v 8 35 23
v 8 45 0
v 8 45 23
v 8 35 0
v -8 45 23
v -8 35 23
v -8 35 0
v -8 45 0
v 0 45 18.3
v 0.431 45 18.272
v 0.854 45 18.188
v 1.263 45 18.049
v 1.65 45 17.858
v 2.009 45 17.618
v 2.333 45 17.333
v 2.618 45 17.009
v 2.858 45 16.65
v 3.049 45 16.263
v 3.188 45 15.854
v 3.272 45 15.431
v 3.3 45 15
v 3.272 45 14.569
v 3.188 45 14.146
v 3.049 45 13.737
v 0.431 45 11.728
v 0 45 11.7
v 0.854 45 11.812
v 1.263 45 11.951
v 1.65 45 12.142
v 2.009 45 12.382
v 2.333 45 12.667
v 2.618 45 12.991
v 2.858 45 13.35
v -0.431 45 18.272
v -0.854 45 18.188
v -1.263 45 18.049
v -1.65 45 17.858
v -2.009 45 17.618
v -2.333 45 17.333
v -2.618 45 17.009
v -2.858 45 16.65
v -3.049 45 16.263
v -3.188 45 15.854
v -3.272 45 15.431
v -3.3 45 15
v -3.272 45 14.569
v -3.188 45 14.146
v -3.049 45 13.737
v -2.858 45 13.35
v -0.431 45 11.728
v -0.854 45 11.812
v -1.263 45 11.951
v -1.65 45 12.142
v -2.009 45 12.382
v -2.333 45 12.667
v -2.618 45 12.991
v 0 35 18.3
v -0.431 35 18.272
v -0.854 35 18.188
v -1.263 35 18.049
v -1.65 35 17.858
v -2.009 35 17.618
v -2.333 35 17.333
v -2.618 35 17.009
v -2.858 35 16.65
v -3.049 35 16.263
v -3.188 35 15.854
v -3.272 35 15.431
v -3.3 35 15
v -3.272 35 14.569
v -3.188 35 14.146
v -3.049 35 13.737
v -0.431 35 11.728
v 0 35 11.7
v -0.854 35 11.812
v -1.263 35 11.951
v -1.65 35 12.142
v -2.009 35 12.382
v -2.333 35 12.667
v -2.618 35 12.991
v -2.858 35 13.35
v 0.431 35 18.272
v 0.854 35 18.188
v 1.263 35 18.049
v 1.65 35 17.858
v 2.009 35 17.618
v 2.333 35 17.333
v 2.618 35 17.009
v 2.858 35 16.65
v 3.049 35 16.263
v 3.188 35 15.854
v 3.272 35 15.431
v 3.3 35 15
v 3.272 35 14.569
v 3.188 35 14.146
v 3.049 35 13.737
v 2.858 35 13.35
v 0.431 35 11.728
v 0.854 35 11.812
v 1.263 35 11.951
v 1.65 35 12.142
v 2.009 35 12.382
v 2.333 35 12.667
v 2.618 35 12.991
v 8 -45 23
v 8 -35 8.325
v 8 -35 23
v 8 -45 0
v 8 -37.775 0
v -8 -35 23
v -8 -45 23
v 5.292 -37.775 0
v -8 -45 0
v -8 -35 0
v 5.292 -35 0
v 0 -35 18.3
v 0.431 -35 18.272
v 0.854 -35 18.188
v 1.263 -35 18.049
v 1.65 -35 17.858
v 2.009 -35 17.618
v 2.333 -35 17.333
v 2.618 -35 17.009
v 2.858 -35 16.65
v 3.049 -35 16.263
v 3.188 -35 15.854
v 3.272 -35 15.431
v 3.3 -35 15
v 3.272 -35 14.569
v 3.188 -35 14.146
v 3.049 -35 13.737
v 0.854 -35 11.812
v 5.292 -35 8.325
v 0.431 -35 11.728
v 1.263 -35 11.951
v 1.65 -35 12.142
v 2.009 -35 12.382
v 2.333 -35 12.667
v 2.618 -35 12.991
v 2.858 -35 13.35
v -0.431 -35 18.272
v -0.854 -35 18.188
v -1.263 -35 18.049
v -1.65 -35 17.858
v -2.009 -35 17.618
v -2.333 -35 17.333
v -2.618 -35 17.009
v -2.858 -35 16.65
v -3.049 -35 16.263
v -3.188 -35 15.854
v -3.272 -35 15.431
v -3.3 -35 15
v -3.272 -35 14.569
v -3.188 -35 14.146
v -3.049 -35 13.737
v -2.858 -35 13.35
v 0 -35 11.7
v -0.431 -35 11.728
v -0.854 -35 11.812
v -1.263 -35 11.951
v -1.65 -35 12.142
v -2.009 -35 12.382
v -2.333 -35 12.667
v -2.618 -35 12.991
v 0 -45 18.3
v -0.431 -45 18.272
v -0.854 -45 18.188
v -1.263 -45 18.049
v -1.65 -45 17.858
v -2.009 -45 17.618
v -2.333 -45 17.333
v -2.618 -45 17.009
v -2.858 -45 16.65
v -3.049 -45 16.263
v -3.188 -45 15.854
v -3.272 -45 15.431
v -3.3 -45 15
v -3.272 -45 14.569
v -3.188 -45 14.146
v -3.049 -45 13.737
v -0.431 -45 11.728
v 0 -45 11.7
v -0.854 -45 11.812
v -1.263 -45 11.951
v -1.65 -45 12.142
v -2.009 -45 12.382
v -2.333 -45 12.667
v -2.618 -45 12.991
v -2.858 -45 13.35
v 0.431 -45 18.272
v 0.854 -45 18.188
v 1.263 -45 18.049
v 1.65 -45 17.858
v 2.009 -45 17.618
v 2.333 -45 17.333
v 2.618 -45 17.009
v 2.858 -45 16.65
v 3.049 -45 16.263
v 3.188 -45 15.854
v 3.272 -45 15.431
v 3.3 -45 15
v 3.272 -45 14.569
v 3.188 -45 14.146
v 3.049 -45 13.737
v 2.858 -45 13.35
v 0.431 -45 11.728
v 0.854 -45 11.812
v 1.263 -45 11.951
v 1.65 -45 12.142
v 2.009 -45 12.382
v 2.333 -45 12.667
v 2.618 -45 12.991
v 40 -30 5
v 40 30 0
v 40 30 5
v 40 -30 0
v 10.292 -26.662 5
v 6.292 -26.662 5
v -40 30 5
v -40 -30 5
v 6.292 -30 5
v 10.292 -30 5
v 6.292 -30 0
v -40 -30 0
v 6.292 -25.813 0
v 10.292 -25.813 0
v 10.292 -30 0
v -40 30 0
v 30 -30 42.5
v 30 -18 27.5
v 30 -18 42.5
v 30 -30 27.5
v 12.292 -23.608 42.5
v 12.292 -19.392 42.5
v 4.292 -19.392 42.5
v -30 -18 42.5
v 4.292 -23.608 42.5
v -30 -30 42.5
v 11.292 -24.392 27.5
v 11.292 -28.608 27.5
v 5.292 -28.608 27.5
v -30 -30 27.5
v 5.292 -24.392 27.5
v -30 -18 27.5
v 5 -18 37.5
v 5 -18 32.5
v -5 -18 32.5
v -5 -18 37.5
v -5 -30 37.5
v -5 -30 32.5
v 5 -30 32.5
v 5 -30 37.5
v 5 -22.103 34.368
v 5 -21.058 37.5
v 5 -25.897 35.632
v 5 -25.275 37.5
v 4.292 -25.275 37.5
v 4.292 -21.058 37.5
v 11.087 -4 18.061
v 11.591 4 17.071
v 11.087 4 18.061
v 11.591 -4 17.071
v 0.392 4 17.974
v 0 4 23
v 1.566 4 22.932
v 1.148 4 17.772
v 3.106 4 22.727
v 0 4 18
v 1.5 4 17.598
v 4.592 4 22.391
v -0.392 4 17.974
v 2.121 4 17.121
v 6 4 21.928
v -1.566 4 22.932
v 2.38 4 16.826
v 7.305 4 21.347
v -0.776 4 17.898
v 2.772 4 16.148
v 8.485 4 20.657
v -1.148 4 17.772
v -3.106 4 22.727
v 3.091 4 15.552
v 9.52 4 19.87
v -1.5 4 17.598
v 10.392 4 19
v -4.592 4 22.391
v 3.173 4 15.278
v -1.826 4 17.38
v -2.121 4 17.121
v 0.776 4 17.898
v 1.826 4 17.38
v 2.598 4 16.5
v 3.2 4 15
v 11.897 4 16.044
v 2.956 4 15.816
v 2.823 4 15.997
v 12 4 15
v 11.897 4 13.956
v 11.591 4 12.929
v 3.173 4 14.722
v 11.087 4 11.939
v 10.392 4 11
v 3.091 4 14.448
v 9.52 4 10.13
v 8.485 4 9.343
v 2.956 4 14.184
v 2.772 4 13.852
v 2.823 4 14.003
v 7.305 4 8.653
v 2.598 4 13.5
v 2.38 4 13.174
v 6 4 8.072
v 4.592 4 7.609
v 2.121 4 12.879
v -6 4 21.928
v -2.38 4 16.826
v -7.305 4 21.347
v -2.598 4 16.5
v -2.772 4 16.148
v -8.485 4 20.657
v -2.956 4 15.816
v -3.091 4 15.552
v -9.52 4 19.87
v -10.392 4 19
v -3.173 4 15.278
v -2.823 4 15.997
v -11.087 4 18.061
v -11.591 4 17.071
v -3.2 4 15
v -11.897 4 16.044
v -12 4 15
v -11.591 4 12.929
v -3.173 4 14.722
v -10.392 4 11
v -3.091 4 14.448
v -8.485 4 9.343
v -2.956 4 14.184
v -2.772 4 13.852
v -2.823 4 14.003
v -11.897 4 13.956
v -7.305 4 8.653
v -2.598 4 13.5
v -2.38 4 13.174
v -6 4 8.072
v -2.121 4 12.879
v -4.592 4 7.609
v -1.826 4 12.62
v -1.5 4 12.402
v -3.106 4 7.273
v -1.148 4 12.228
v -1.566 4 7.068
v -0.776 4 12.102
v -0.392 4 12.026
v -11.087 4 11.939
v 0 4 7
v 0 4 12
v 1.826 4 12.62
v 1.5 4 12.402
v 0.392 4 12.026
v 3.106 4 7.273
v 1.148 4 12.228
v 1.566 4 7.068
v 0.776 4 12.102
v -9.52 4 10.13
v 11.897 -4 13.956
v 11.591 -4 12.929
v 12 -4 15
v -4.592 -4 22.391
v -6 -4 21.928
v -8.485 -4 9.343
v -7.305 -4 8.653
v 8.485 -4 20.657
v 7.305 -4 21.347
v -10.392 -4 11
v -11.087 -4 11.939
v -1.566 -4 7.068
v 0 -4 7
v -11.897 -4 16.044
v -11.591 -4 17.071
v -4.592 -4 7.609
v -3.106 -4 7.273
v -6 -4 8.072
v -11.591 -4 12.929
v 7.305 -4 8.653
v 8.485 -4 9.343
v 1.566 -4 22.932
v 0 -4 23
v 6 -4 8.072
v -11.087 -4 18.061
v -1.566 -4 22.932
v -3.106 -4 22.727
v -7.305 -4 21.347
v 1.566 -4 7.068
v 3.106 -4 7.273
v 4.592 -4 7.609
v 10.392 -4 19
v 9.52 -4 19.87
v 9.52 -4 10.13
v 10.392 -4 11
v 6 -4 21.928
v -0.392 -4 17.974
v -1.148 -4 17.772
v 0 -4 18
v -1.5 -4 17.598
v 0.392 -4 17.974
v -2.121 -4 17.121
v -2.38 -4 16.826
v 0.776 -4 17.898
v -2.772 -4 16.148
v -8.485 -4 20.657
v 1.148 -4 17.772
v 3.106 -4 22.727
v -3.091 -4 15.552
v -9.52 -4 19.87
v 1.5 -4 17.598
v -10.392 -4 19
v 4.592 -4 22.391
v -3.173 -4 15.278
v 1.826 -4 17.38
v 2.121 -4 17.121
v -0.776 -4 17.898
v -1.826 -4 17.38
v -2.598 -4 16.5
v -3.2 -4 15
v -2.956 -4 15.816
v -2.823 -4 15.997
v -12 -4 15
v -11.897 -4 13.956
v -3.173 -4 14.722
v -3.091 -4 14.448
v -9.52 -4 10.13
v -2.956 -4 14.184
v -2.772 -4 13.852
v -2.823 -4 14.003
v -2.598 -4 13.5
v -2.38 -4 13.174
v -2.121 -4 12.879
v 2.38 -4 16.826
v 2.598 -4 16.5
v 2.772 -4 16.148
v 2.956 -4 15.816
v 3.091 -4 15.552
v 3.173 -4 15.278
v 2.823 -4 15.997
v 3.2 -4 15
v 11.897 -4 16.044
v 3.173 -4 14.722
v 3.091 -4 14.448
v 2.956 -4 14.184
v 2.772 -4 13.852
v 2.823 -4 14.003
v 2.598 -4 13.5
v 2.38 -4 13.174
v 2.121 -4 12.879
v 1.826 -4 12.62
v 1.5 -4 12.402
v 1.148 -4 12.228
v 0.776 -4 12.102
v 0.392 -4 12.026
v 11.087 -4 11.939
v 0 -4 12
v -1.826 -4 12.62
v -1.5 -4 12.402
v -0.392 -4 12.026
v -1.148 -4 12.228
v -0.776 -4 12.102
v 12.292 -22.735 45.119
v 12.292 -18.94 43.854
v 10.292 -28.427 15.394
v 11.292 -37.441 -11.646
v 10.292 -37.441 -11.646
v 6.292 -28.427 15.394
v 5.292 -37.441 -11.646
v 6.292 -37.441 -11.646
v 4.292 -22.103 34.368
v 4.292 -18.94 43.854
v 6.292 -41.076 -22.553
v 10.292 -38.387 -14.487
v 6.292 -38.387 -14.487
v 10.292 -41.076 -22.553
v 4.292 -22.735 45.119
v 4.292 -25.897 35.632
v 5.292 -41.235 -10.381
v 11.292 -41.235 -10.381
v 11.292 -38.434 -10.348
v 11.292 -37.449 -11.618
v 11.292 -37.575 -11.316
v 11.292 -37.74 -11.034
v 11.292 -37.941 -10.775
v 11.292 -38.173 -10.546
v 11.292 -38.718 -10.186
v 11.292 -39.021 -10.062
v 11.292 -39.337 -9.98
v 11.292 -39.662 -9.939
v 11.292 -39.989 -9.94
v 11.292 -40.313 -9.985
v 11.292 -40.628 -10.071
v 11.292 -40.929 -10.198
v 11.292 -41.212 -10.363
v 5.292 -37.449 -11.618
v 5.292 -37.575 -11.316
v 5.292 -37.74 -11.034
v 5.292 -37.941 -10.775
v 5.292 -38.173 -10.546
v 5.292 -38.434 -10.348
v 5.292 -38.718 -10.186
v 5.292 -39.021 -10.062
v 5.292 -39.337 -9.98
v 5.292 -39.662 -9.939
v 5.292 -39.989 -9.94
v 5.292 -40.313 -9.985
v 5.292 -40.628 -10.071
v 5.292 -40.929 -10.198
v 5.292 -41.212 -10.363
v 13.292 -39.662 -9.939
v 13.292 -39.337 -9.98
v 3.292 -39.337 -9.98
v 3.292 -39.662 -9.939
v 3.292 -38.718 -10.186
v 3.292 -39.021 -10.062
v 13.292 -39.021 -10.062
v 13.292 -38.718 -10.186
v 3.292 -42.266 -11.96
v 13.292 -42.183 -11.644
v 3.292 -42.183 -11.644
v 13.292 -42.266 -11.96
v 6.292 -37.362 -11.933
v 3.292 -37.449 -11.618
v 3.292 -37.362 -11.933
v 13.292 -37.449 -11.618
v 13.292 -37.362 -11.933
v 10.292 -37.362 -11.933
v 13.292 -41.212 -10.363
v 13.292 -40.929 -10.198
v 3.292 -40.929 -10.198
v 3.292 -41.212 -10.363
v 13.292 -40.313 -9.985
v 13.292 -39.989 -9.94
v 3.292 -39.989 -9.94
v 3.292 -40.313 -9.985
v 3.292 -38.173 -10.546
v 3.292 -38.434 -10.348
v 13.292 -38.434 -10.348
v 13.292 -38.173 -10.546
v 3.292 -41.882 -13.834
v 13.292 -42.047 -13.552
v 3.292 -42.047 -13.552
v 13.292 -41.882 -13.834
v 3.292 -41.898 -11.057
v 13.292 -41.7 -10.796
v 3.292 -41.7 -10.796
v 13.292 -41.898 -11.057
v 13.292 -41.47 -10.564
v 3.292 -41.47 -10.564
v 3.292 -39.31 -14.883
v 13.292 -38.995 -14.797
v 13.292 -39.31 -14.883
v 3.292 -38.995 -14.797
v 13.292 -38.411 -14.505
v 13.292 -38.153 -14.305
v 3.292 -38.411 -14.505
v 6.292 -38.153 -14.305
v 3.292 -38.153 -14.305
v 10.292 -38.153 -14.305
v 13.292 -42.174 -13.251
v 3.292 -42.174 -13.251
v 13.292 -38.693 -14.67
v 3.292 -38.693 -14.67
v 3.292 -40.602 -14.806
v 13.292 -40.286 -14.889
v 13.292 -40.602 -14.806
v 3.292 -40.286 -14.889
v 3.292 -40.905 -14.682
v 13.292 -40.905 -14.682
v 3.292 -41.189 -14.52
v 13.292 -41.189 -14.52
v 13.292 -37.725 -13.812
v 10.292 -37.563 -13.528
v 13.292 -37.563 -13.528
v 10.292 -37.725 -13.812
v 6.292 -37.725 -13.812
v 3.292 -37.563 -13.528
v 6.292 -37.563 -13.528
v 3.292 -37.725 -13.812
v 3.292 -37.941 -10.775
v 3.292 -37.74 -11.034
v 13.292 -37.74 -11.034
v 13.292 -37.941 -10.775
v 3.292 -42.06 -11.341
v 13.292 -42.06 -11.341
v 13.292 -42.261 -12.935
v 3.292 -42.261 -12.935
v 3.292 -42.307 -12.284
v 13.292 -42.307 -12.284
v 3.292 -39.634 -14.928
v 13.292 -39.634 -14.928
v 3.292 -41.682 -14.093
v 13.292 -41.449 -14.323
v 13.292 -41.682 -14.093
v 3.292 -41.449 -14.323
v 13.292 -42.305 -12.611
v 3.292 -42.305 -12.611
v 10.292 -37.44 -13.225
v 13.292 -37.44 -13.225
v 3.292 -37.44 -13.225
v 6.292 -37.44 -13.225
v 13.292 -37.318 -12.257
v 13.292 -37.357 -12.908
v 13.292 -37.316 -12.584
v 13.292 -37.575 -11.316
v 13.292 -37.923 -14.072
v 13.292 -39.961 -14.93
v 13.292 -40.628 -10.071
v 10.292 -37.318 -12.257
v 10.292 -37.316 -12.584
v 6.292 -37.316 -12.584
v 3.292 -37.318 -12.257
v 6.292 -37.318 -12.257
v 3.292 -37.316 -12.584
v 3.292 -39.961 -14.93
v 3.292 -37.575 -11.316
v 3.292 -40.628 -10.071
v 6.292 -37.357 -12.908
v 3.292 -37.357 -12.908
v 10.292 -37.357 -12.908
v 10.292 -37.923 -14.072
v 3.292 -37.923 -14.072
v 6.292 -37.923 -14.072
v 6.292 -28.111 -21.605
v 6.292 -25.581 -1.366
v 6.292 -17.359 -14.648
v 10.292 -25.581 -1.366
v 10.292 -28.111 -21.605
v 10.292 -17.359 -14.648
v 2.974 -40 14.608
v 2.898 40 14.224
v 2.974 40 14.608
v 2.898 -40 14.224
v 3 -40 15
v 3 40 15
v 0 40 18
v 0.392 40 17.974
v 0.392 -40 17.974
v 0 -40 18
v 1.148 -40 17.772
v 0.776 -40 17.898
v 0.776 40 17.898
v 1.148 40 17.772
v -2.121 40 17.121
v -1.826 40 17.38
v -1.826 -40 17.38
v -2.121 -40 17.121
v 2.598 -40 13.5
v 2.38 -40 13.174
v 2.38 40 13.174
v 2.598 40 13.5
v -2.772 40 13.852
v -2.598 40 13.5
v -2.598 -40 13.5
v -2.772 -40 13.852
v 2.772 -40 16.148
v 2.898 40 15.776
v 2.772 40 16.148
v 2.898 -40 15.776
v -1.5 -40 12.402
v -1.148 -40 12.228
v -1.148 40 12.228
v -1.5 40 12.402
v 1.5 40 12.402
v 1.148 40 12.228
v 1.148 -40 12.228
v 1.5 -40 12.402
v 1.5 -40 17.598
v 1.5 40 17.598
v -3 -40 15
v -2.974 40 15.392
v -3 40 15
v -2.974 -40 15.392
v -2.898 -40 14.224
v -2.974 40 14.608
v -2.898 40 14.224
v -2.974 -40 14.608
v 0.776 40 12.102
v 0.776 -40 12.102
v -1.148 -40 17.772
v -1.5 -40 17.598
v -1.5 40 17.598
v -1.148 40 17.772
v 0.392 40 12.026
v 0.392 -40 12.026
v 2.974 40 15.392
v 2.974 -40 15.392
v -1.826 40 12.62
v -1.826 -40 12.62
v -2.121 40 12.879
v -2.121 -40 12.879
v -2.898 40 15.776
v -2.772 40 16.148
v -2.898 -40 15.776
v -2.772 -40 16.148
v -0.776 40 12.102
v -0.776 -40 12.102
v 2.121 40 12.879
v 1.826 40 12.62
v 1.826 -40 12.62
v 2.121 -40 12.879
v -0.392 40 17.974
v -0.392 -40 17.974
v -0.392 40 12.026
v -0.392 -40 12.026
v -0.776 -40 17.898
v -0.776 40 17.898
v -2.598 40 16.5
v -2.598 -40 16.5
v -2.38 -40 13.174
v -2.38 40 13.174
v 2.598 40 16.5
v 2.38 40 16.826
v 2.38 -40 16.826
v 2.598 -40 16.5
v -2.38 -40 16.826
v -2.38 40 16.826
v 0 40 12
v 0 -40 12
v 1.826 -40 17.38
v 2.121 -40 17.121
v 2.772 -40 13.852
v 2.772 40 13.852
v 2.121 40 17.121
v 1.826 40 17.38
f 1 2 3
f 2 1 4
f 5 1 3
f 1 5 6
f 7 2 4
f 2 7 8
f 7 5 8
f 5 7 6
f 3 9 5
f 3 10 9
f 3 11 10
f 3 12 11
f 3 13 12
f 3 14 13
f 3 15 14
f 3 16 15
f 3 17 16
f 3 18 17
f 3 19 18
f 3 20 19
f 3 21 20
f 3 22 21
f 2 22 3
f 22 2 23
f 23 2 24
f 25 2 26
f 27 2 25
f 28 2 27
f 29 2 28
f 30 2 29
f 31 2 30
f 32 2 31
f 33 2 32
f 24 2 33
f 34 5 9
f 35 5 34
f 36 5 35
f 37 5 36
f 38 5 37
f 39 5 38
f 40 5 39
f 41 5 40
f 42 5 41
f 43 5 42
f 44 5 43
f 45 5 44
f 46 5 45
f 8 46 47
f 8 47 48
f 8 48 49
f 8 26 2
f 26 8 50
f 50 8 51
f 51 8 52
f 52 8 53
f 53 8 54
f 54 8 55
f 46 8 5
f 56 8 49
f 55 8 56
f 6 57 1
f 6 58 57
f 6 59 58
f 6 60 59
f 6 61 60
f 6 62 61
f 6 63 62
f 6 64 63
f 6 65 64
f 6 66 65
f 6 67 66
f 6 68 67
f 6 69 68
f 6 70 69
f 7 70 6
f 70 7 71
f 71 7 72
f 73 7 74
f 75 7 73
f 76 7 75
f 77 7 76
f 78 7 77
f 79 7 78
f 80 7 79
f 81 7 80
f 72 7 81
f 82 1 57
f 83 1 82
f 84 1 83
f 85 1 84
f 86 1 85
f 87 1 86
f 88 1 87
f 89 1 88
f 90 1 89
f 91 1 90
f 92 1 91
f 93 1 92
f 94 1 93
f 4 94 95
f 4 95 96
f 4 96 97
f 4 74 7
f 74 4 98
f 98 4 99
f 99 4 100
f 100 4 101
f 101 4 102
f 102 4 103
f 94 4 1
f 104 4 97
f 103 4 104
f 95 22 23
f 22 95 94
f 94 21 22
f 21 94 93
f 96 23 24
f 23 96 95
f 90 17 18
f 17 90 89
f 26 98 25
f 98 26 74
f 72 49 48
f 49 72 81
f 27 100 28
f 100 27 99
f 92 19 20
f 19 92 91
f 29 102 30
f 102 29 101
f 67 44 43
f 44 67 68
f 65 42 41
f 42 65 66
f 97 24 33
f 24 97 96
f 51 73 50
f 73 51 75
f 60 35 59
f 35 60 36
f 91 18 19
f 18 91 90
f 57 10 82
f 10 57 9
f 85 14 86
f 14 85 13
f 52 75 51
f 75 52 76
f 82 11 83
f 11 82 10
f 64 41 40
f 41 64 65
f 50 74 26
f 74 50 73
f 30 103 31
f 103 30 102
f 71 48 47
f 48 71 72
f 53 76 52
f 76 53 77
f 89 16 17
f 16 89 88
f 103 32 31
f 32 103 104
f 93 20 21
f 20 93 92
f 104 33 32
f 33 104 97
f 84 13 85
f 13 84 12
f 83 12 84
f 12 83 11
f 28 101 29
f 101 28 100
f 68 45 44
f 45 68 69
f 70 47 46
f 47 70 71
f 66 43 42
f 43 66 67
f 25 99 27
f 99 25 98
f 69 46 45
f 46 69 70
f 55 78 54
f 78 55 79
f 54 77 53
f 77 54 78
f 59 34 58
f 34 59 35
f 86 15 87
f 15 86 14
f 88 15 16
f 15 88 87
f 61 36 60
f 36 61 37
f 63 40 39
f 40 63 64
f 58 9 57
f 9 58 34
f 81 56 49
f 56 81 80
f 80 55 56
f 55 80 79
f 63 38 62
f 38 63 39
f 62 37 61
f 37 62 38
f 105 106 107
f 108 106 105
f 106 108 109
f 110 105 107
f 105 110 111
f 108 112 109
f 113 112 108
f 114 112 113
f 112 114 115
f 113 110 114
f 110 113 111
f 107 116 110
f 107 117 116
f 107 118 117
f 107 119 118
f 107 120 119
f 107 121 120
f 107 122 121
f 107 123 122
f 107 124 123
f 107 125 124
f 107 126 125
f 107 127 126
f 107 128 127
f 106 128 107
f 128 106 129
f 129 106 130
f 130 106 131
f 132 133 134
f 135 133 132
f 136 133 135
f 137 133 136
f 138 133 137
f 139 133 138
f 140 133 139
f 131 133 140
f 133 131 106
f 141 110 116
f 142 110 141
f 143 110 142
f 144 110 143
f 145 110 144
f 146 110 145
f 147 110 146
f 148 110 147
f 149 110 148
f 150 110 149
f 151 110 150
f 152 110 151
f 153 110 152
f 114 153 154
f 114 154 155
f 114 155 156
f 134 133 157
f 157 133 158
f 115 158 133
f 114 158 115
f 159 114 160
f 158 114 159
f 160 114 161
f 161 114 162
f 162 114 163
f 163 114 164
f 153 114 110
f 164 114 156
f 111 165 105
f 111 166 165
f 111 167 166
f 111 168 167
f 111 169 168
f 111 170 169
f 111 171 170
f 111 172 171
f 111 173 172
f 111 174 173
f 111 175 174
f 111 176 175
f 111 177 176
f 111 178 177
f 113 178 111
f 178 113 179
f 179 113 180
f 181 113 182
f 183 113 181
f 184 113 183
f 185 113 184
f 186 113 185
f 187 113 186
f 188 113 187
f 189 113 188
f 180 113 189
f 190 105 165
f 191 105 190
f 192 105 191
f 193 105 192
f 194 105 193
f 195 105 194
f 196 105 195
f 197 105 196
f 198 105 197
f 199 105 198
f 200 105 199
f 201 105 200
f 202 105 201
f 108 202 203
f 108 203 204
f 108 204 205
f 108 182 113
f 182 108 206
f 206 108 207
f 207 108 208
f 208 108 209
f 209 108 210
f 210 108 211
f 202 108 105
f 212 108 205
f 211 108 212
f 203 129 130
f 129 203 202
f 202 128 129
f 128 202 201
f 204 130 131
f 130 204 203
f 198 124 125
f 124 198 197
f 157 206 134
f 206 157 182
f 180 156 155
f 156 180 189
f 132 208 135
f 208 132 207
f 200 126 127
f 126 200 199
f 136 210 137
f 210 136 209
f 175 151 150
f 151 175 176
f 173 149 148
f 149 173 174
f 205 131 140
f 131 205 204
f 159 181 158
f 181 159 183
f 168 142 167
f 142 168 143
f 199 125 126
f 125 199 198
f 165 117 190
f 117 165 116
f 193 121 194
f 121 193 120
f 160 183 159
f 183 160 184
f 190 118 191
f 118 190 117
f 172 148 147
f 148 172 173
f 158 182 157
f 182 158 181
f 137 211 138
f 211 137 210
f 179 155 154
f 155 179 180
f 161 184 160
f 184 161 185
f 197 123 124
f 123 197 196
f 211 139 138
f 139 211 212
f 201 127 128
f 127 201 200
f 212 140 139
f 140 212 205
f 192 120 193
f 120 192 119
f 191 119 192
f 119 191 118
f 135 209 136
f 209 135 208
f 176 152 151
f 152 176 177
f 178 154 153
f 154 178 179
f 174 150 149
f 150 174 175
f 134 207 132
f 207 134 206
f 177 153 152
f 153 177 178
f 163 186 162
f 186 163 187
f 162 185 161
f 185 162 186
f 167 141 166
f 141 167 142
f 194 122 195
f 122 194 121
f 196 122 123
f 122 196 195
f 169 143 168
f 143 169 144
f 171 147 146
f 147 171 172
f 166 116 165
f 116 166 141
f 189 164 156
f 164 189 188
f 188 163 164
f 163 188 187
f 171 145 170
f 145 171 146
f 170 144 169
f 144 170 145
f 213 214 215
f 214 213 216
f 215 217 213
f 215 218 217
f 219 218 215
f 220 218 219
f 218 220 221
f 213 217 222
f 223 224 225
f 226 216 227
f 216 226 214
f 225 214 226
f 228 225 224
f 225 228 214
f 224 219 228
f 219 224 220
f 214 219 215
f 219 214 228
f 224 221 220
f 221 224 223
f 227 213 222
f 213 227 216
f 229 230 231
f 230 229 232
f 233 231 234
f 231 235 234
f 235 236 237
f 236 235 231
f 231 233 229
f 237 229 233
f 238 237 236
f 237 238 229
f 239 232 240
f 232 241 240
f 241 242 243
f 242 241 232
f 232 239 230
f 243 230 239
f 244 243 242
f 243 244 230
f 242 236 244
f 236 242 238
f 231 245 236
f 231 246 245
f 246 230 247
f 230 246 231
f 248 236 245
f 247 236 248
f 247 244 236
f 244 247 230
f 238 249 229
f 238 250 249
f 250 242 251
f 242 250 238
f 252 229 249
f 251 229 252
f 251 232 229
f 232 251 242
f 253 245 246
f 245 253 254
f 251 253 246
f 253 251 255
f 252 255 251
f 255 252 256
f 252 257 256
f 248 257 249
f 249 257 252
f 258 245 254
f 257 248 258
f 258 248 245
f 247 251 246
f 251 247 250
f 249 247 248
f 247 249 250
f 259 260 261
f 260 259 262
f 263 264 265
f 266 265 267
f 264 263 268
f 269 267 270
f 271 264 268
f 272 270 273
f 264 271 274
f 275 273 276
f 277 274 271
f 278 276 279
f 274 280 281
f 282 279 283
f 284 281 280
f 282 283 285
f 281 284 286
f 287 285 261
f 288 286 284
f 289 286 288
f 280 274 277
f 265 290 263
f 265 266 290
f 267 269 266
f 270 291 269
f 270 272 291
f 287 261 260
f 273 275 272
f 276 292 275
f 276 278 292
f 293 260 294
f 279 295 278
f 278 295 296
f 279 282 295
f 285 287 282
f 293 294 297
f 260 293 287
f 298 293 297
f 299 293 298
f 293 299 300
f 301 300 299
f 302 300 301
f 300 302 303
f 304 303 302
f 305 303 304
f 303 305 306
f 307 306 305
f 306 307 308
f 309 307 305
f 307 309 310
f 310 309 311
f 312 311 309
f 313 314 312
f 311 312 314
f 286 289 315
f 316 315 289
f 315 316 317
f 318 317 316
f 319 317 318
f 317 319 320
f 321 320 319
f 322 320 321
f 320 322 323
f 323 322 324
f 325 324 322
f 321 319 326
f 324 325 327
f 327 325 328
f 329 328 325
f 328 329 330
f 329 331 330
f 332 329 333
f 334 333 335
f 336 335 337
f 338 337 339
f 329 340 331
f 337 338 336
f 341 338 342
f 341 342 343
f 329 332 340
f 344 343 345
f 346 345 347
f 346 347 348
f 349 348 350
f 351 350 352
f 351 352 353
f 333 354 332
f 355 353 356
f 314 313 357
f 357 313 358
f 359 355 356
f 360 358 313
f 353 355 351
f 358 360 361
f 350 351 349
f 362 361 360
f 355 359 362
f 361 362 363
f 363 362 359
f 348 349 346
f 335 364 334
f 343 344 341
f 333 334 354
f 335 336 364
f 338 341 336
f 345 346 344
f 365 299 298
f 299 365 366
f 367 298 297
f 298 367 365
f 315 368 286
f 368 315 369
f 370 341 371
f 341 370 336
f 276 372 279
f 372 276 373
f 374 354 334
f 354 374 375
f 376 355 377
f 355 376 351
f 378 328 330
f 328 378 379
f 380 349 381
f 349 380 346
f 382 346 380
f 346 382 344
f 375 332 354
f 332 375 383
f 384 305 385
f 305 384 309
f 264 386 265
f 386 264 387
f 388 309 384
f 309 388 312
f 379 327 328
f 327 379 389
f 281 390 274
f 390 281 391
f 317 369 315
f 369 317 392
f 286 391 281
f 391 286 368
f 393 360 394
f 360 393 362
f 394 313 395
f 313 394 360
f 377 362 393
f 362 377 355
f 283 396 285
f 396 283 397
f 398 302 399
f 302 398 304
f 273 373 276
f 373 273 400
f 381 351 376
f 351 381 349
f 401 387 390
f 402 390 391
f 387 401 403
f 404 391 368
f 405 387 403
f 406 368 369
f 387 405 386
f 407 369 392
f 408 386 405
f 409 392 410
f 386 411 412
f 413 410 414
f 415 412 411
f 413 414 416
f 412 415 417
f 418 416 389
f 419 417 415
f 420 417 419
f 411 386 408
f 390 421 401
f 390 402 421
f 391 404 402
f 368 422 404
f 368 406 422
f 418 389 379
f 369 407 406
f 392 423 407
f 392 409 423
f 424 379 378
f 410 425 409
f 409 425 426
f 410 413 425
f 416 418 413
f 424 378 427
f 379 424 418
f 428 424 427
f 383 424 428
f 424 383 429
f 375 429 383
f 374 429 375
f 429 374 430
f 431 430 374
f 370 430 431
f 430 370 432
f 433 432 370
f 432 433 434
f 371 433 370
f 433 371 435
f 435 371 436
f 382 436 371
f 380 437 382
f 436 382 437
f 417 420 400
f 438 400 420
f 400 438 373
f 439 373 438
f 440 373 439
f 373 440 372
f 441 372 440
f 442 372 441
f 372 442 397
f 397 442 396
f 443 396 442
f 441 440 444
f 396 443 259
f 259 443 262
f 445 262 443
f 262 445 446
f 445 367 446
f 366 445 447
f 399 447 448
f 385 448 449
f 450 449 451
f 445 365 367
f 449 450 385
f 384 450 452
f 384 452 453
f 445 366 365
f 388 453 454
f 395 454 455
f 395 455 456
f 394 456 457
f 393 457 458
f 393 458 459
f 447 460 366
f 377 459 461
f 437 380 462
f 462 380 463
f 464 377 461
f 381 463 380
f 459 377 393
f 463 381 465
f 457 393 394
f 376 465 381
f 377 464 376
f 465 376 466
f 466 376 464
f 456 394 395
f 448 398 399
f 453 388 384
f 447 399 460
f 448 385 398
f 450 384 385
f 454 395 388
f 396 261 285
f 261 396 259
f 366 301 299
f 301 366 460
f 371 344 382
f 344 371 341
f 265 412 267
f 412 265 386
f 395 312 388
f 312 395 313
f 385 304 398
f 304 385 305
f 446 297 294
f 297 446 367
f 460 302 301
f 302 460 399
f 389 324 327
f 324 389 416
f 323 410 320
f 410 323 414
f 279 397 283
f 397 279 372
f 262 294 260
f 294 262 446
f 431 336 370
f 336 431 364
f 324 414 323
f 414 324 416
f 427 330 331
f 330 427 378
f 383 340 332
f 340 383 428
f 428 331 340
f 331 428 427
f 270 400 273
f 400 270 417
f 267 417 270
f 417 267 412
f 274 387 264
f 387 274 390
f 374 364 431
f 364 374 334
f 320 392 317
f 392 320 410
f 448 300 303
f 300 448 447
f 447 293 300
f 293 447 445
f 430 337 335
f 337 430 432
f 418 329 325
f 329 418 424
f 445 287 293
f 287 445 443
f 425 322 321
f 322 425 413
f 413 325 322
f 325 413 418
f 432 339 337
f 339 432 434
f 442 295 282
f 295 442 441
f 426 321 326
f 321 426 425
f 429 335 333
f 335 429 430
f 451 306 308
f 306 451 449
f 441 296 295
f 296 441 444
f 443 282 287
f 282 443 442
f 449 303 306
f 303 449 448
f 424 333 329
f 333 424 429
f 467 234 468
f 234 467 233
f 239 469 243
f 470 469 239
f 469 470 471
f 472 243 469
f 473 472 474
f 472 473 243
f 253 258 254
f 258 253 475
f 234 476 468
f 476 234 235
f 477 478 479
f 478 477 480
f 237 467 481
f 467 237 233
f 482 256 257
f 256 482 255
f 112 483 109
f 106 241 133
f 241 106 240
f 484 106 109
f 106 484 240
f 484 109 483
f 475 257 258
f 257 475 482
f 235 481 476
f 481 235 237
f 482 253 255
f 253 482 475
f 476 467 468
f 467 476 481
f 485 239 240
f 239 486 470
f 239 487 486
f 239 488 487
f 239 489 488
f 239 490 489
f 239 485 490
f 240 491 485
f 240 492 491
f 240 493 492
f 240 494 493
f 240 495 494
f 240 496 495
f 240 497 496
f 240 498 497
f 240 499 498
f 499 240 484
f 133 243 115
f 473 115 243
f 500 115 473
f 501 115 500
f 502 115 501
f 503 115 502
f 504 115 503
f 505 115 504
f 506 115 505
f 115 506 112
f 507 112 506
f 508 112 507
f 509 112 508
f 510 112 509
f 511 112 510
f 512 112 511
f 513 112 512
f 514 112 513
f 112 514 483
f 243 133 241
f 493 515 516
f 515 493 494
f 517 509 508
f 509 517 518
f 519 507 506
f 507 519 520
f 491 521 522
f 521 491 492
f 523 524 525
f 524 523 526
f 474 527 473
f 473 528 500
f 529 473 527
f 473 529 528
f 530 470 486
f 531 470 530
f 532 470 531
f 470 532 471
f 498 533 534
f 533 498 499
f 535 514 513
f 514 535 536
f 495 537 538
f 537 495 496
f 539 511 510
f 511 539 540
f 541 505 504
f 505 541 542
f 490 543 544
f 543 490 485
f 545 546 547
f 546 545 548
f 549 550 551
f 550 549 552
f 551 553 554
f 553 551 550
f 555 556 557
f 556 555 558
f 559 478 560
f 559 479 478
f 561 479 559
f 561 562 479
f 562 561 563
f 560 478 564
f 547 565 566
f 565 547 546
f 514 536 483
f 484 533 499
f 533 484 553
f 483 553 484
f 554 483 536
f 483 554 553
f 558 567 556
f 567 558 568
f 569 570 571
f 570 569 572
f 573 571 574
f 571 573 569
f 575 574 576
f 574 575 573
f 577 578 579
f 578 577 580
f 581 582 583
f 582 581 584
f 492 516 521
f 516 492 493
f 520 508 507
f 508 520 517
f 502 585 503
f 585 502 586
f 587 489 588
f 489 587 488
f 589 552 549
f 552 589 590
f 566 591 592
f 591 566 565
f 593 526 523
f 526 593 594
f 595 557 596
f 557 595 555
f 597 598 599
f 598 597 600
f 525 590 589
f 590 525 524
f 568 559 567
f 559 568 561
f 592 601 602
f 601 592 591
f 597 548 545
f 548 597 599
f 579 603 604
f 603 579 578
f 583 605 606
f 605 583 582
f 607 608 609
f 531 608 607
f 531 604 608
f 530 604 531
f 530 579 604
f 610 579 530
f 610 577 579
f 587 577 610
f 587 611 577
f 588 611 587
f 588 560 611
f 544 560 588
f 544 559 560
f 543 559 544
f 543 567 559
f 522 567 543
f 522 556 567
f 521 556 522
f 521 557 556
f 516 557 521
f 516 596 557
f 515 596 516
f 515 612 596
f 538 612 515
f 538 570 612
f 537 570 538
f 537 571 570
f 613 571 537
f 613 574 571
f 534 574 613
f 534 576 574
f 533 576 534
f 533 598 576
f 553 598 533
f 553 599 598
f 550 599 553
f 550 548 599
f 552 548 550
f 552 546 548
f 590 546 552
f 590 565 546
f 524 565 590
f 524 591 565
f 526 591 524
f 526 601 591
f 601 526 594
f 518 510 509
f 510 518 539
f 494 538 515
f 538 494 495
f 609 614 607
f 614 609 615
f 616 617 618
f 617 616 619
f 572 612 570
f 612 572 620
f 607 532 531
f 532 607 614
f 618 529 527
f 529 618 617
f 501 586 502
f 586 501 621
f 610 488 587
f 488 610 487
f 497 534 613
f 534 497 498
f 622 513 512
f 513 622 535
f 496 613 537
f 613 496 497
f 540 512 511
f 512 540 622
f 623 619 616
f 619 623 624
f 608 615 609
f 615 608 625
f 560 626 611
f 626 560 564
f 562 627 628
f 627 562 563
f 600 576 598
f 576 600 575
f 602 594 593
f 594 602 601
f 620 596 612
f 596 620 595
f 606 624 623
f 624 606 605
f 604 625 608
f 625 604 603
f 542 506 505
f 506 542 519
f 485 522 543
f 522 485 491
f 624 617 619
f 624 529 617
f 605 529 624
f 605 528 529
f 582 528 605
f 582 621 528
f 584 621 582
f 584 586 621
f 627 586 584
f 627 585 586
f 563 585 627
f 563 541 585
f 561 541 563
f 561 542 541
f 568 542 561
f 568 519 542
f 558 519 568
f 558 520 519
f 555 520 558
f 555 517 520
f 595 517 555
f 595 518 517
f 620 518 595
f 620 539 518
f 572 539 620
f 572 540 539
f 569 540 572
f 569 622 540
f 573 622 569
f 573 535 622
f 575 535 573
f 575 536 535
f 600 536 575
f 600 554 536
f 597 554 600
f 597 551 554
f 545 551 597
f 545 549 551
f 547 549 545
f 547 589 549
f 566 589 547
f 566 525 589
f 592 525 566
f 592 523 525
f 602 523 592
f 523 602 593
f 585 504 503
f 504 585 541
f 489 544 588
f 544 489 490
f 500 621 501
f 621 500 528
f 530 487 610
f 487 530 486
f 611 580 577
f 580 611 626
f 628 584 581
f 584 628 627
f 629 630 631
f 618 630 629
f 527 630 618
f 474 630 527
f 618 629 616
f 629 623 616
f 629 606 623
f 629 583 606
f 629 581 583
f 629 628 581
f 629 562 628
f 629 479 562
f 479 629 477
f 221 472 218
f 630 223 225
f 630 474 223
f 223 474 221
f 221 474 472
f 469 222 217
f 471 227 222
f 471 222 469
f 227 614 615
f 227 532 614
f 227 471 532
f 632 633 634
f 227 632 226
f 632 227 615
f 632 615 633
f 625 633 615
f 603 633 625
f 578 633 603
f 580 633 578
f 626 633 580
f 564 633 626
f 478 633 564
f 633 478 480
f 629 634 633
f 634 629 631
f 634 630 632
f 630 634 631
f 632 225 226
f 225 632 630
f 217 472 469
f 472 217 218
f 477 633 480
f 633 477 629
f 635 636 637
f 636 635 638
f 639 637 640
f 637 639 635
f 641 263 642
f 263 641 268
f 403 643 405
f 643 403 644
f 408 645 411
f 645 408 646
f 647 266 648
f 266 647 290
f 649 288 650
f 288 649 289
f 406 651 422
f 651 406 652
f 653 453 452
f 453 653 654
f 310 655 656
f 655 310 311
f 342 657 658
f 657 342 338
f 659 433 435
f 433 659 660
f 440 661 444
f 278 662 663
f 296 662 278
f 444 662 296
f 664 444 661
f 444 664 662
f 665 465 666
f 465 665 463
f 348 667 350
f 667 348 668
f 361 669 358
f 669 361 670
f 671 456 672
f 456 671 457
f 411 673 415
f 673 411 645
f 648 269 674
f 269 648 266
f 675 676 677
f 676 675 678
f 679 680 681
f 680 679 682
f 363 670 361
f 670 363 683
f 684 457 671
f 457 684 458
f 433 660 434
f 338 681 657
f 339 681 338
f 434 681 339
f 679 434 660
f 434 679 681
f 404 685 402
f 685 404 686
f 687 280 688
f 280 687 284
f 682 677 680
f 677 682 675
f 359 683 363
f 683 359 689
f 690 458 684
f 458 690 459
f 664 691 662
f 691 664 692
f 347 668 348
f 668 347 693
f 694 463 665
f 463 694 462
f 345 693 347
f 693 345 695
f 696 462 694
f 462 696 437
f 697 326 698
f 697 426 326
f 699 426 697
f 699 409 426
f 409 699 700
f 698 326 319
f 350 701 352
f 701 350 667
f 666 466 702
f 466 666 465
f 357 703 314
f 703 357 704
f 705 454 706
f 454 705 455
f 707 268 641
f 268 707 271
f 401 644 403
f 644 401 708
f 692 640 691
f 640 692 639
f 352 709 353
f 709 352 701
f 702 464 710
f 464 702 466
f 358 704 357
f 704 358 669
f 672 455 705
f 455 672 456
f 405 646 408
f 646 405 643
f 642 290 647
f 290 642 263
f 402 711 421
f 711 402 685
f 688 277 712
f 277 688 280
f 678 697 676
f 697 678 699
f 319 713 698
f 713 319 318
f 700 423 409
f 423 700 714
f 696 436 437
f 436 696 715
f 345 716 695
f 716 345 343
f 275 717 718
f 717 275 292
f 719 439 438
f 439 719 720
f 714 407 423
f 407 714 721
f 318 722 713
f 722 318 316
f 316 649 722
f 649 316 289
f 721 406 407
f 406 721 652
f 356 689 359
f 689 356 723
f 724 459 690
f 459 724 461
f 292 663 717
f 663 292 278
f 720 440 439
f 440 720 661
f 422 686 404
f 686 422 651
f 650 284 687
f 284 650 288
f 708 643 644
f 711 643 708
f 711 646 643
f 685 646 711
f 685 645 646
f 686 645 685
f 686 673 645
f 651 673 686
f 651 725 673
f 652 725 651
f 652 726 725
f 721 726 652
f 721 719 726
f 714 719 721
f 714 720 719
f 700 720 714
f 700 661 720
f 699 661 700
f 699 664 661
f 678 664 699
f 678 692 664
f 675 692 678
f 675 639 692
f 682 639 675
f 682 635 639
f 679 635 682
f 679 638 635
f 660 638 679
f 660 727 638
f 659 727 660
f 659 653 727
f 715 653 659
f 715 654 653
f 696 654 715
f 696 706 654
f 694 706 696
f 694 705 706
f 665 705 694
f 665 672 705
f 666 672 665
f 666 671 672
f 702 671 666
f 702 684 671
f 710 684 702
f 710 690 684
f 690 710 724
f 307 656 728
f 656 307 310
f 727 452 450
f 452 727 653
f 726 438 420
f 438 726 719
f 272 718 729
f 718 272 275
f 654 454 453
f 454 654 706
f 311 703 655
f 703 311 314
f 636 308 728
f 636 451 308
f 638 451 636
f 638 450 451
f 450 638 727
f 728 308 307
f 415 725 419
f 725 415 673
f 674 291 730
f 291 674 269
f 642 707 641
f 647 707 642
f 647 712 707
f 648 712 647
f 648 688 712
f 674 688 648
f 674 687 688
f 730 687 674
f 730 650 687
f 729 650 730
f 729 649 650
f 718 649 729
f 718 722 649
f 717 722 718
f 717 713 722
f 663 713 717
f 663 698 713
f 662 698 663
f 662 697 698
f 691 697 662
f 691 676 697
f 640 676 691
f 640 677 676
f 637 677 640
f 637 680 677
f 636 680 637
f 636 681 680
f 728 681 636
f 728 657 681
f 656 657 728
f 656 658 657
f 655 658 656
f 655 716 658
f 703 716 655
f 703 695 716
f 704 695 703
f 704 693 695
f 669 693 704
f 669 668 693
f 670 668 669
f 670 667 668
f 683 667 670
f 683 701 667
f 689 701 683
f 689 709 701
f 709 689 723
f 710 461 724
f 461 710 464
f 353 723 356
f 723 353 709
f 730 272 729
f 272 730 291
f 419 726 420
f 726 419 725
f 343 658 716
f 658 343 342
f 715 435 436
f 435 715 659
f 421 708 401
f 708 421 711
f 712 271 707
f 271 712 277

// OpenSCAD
/*
 * WAVE OCEAN V10 - APPROACH B: CAM-FOLLOWER
 * Single wave test - validates mechanism geometry
 *
 * VIEWER POV: Front view, looking at -Y axis
 *   X = horizontal (left/right)
 *   Z = vertical (up/down)
 *   Y = depth (into screen)
 *
 * MECHANISM: Elliptical cam drives wave slat that pivots on tab-in-slot
 *   - Camshaft with elliptical cam
 *   - Wave slat has follower pin riding on cam surface
 *   - Tab at back end slides in horizontal slot (constrained pivot)
 *
 * Expected motion: Wave rocks like seesaw, front rises/falls with cam
 */

$fn = 48;

// ============================================
// ANIMATION
// ============================================

MANUAL_ANGLE = -1;  // Set 0-360 for static, -1 for animation
theta = (MANUAL_ANGLE >= 0) ? MANUAL_ANGLE : $t * 360;

// ============================================
// PHYSICAL DIMENSIONS (mm)
// ============================================

// Camshaft (runs along Y axis, perpendicular to viewer)
CAMSHAFT_DIA = 6;
CAMSHAFT_LENGTH = 80;
CAMSHAFT_X = 0;        // Centered in X
CAMSHAFT_Z = 15;       // Height of shaft axis

// Elliptical cam (mounted on shaft)
CAM_MAJOR = 12;        // Vertical radius (determines amplitude)
CAM_MINOR = 8;         // Horizontal radius (along shaft axis)
CAM_WIDTH = 8;         // Thickness of cam

// Slot rail (back of mechanism, wave tab slides in slot)
SLOT_RAIL_Y = -30;     // Position (back, away from viewer)
SLOT_RAIL_Z = 35;      // Height of slot
SLOT_RAIL_LENGTH = 60; // X dimension
SLOT_RAIL_HEIGHT = 15; // Z dimension
SLOT_RAIL_DEPTH = 12;  // Y dimension

SLOT_WIDTH = 10;       // X dimension (allows horizontal slide)
SLOT_HEIGHT = 5;       // Z dimension (fits 4mm tab)

// Wave slat (connects tab to follower)
SLAT_LENGTH = 50;      // From tab pivot to follower contact
SLAT_WIDTH = 6;        // X dimension
SLAT_THICKNESS = 4;    // Y dimension

// Tab (at back end, slides in slot)
TAB_WIDTH = 8;
TAB_HEIGHT = 4;
TAB_DEPTH = 10;

// Follower pin (at front end, contacts cam)
FOLLOWER_DIA = 5;
FOLLOWER_LENGTH = 10;

// Wave profile (decorative shape on top of slat)
WAVE_PROFILE_WIDTH = 40;
WAVE_PROFILE_HEIGHT = 20;

// Frame reference
FRAME_WIDTH = 80;
FRAME_DEPTH = 60;
FRAME_HEIGHT = 5;

// ============================================
// COLORS
// ============================================

C_SHAFT = [0.6, 0.6, 0.65];
C_CAM = [0.8, 0.5, 0.2];       // Bronze
C_SLOT_RAIL = [0.35, 0.35, 0.4];
C_SLAT = [0.25, 0.45, 0.75];   // Ocean blue
C_FOLLOWER = [0.5, 0.5, 0.55];
C_FRAME = [0.3, 0.3, 0.35];

// ============================================
// KINEMATICS
// ============================================

// Cam surface position (where follower contacts cam)
// Cam is ellipse: z = CAM_MAJOR * cos(theta), y = CAM_MINOR * sin(theta)
function cam_contact_z() = CAMSHAFT_Z + CAM_MAJOR * cos(theta);
function cam_contact_y() = CAM_MINOR * sin(theta);  // Relative to shaft Y

// Tab position (pivot point, slides in slot)
TAB_Y = SLOT_RAIL_Y + SLOT_RAIL_DEPTH / 2;
TAB_Z = SLOT_RAIL_Z;

// Wave slat angle (from geometry)
// Slat goes from tab (back) to follower contact (front)
// tan(angle) = (cam_z - tab_z) / (cam_y - tab_y)
function slat_angle() =
    let(
        fz = cam_contact_z(),
        fy = cam_contact_y(),
        tz = TAB_Z,
        ty = TAB_Y
    )
    atan2(fz - tz, fy - ty);

// Tab X position (slides to accommodate angle change)
// As slat rotates, tab needs to move horizontally
function tab_x_offset() =
    let(angle = slat_angle())
    SLAT_LENGTH * (1 - cos(angle - 45)) * 0.3;  // Approximate

// Verify slat length is constant
function verify_slat_length() =
    let(
        fz = cam_contact_z(),
        fy = cam_contact_y(),
        tz = TAB_Z,
        ty = TAB_Y
    )
    sqrt(pow(fy - ty, 2) + pow(fz - tz, 2));

// ============================================
// MODULES: MECHANISM PARTS
// ============================================

// Camshaft (runs along Y axis)
module camshaft() {
    color(C_SHAFT)
    translate([CAMSHAFT_X, -CAMSHAFT_LENGTH/2, CAMSHAFT_Z])
    rotate([-90, 0, 0])
        cylinder(d=CAMSHAFT_DIA, h=CAMSHAFT_LENGTH);
}

// Elliptical cam (mounted on shaft, rotates with it)
module elliptical_cam() {
    cam_y = 0;  // Center position along shaft

    color(C_CAM)
    translate([CAMSHAFT_X, cam_y, CAMSHAFT_Z])
    rotate([-90, 0, 0])  // Align with shaft
    rotate([0, 0, theta])  // Rotate with animation
    scale([1, CAM_MINOR / CAM_MAJOR, 1])
    difference() {
        cylinder(r=CAM_MAJOR, h=CAM_WIDTH, center=true);
        cylinder(d=CAMSHAFT_DIA + 0.4, h=CAM_WIDTH + 2, center=true);
    }
}

// Slot rail (tab slides in slot, constrained pivot)
module slot_rail() {
    color(C_SLOT_RAIL)
    translate([-SLOT_RAIL_LENGTH/2, SLOT_RAIL_Y, SLOT_RAIL_Z - SLOT_RAIL_HEIGHT/2])
    difference() {
        // Rail body
        cube([SLOT_RAIL_LENGTH, SLOT_RAIL_DEPTH, SLOT_RAIL_HEIGHT]);
        // Slot for tab
        translate([SLOT_RAIL_LENGTH/2 - SLOT_WIDTH/2, -1, SLOT_RAIL_HEIGHT/2 - SLOT_HEIGHT/2])
            cube([SLOT_WIDTH, SLOT_RAIL_DEPTH + 2, SLOT_HEIGHT]);
    }
}

// Wave slat with tab and follower
module wave_slat() {
    angle = slat_angle();
    tx = tab_x_offset();

    // Position at tab pivot point
    translate([tx, TAB_Y, TAB_Z])
    rotate([angle - 90, 0, 0]) {  // Rotate to follow cam
        // Tab (back end, rides in slot)
        color(C_SLAT)
        translate([-TAB_WIDTH/2, -TAB_DEPTH, -TAB_HEIGHT/2])
            cube([TAB_WIDTH, TAB_DEPTH, TAB_HEIGHT]);

        // Slat body (connects tab to follower)
        color(C_SLAT)
        translate([-SLAT_WIDTH/2, 0, -SLAT_THICKNESS/2])
            cube([SLAT_WIDTH, SLAT_LENGTH, SLAT_THICKNESS]);

        // Follower pin (front end, contacts cam)
        color(C_FOLLOWER)
        translate([0, SLAT_LENGTH, 0])
        rotate([0, 90, 0])
            cylinder(d=FOLLOWER_DIA, h=FOLLOWER_LENGTH, center=true);

        // Wave profile (decorative ocean wave shape on top)
        color(C_SLAT)
        translate([0, SLAT_LENGTH * 0.4, SLAT_THICKNESS/2])
        rotate([90, 0, 90])
        linear_extrude(height=4, center=true)
        polygon([
            [0, 0],
            [SLAT_LENGTH * 0.3, WAVE_PROFILE_HEIGHT * 0.4],
            [SLAT_LENGTH * 0.5, WAVE_PROFILE_HEIGHT],
            [SLAT_LENGTH * 0.7, WAVE_PROFILE_HEIGHT * 0.6],
            [SLAT_LENGTH * 0.8, 0]
        ]);
    }
}

// Base frame (static reference)
module base_frame() {
    color(C_FRAME)
    translate([-FRAME_WIDTH/2, -FRAME_DEPTH/2, 0])
        cube([FRAME_WIDTH, FRAME_DEPTH, FRAME_HEIGHT]);

    // Shaft supports
    color(C_FRAME) {
        // Front bearing
        translate([CAMSHAFT_X - 8, CAMSHAFT_LENGTH/2 - 5, 0])
        difference() {
            cube([16, 10, CAMSHAFT_Z + 8]);
            translate([8, 5, CAMSHAFT_Z])
            rotate([-90, 0, 0])
                cylinder(d=CAMSHAFT_DIA + 0.6, h=12, center=true);
        }

        // Back bearing
        translate([CAMSHAFT_X - 8, -CAMSHAFT_LENGTH/2 - 5, 0])
        difference() {
            cube([16, 10, CAMSHAFT_Z + 8]);
            translate([8, 5, CAMSHAFT_Z])
            rotate([-90, 0, 0])
                cylinder(d=CAMSHAFT_DIA + 0.6, h=12, center=true);
        }
    }
}

// Follower contact point visualization (debug)
module follower_contact_point() {
    color([1, 0, 0])
    translate([CAMSHAFT_X, cam_contact_y(), cam_contact_z()])
        sphere(d=3);
}

// ============================================
// MAIN ASSEMBLY
// ============================================

module wave_ocean_v10_camB() {
    base_frame();
    slot_rail();
    camshaft();
    elliptical_cam();
    wave_slat();
    // follower_contact_point();  // Uncomment to see contact point
}

// Render
wave_ocean_v10_camB();

// ============================================
// DEBUG OUTPUT
// ============================================

echo("=== WAVE OCEAN V10 - APPROACH B: CAM-FOLLOWER ===");
echo(str("theta = ", theta, " degrees"));
echo(str("Cam contact: Y=", cam_contact_y(), " Z=", cam_contact_z()));
echo(str("Slat angle = ", slat_angle(), " degrees"));
echo(str("Tab X offset = ", tab_x_offset(), "mm"));
echo("");
echo("Mechanism check:");
echo(str("  Cam major (Z amplitude): ", CAM_MAJOR, "mm"));
echo(str("  Cam minor (Y offset): ", CAM_MINOR, "mm"));
echo(str("  Slat length: ", SLAT_LENGTH, "mm (should be constant)"));
echo(str("  Verified slat length: ", verify_slat_length(), "mm"));
echo("");
echo("Animation: View -> Animate, FPS=30, Steps=60");
echo("Watch from FRONT (looking at -Y) to see wave rocking motion");

// ============================================
// SIN($t) AUDIT - ALL TRIG TRACES TO MECHANISM
// ============================================

/*
 * cam_contact_z() = CAMSHAFT_Z + CAM_MAJOR * cos(theta)
 *   Physical: Elliptical cam rotation, major axis lifts follower
 *
 * cam_contact_y() = CAM_MINOR * sin(theta)
 *   Physical: Elliptical cam rotation, minor axis shifts follower forward/back
 *
 * slat_angle() = atan2(cam_z - tab_z, cam_y - tab_y)
 *   Physical: Geometry from fixed tab pivot to moving follower contact
 *
 * ORPHAN ANIMATIONS: 0
 */

// ============================================
// MOTION COMPARISON NOTES
// ============================================

/*
 * At theta=0:   Cam pushes follower UP (cam_z = 15 + 12 = 27)
 *               Wave front is HIGH, wave tips forward
 *
 * At theta=90:  Cam at side (cam_z = 15, cam_y = 8)
 *               Wave front at mid height, shifted forward
 *
 * At theta=180: Cam at bottom (cam_z = 15 - 12 = 3)
 *               Wave front is LOW, wave tips back
 *
 * At theta=270: Cam at side (cam_z = 15, cam_y = -8)
 *               Wave front at mid height, shifted back
 *
 * This creates a ROCKING motion with slight Y drift.
 * From front view: looks like wave rising and falling while
 * tilting forward at peak (like a real wave about to break).
 */
